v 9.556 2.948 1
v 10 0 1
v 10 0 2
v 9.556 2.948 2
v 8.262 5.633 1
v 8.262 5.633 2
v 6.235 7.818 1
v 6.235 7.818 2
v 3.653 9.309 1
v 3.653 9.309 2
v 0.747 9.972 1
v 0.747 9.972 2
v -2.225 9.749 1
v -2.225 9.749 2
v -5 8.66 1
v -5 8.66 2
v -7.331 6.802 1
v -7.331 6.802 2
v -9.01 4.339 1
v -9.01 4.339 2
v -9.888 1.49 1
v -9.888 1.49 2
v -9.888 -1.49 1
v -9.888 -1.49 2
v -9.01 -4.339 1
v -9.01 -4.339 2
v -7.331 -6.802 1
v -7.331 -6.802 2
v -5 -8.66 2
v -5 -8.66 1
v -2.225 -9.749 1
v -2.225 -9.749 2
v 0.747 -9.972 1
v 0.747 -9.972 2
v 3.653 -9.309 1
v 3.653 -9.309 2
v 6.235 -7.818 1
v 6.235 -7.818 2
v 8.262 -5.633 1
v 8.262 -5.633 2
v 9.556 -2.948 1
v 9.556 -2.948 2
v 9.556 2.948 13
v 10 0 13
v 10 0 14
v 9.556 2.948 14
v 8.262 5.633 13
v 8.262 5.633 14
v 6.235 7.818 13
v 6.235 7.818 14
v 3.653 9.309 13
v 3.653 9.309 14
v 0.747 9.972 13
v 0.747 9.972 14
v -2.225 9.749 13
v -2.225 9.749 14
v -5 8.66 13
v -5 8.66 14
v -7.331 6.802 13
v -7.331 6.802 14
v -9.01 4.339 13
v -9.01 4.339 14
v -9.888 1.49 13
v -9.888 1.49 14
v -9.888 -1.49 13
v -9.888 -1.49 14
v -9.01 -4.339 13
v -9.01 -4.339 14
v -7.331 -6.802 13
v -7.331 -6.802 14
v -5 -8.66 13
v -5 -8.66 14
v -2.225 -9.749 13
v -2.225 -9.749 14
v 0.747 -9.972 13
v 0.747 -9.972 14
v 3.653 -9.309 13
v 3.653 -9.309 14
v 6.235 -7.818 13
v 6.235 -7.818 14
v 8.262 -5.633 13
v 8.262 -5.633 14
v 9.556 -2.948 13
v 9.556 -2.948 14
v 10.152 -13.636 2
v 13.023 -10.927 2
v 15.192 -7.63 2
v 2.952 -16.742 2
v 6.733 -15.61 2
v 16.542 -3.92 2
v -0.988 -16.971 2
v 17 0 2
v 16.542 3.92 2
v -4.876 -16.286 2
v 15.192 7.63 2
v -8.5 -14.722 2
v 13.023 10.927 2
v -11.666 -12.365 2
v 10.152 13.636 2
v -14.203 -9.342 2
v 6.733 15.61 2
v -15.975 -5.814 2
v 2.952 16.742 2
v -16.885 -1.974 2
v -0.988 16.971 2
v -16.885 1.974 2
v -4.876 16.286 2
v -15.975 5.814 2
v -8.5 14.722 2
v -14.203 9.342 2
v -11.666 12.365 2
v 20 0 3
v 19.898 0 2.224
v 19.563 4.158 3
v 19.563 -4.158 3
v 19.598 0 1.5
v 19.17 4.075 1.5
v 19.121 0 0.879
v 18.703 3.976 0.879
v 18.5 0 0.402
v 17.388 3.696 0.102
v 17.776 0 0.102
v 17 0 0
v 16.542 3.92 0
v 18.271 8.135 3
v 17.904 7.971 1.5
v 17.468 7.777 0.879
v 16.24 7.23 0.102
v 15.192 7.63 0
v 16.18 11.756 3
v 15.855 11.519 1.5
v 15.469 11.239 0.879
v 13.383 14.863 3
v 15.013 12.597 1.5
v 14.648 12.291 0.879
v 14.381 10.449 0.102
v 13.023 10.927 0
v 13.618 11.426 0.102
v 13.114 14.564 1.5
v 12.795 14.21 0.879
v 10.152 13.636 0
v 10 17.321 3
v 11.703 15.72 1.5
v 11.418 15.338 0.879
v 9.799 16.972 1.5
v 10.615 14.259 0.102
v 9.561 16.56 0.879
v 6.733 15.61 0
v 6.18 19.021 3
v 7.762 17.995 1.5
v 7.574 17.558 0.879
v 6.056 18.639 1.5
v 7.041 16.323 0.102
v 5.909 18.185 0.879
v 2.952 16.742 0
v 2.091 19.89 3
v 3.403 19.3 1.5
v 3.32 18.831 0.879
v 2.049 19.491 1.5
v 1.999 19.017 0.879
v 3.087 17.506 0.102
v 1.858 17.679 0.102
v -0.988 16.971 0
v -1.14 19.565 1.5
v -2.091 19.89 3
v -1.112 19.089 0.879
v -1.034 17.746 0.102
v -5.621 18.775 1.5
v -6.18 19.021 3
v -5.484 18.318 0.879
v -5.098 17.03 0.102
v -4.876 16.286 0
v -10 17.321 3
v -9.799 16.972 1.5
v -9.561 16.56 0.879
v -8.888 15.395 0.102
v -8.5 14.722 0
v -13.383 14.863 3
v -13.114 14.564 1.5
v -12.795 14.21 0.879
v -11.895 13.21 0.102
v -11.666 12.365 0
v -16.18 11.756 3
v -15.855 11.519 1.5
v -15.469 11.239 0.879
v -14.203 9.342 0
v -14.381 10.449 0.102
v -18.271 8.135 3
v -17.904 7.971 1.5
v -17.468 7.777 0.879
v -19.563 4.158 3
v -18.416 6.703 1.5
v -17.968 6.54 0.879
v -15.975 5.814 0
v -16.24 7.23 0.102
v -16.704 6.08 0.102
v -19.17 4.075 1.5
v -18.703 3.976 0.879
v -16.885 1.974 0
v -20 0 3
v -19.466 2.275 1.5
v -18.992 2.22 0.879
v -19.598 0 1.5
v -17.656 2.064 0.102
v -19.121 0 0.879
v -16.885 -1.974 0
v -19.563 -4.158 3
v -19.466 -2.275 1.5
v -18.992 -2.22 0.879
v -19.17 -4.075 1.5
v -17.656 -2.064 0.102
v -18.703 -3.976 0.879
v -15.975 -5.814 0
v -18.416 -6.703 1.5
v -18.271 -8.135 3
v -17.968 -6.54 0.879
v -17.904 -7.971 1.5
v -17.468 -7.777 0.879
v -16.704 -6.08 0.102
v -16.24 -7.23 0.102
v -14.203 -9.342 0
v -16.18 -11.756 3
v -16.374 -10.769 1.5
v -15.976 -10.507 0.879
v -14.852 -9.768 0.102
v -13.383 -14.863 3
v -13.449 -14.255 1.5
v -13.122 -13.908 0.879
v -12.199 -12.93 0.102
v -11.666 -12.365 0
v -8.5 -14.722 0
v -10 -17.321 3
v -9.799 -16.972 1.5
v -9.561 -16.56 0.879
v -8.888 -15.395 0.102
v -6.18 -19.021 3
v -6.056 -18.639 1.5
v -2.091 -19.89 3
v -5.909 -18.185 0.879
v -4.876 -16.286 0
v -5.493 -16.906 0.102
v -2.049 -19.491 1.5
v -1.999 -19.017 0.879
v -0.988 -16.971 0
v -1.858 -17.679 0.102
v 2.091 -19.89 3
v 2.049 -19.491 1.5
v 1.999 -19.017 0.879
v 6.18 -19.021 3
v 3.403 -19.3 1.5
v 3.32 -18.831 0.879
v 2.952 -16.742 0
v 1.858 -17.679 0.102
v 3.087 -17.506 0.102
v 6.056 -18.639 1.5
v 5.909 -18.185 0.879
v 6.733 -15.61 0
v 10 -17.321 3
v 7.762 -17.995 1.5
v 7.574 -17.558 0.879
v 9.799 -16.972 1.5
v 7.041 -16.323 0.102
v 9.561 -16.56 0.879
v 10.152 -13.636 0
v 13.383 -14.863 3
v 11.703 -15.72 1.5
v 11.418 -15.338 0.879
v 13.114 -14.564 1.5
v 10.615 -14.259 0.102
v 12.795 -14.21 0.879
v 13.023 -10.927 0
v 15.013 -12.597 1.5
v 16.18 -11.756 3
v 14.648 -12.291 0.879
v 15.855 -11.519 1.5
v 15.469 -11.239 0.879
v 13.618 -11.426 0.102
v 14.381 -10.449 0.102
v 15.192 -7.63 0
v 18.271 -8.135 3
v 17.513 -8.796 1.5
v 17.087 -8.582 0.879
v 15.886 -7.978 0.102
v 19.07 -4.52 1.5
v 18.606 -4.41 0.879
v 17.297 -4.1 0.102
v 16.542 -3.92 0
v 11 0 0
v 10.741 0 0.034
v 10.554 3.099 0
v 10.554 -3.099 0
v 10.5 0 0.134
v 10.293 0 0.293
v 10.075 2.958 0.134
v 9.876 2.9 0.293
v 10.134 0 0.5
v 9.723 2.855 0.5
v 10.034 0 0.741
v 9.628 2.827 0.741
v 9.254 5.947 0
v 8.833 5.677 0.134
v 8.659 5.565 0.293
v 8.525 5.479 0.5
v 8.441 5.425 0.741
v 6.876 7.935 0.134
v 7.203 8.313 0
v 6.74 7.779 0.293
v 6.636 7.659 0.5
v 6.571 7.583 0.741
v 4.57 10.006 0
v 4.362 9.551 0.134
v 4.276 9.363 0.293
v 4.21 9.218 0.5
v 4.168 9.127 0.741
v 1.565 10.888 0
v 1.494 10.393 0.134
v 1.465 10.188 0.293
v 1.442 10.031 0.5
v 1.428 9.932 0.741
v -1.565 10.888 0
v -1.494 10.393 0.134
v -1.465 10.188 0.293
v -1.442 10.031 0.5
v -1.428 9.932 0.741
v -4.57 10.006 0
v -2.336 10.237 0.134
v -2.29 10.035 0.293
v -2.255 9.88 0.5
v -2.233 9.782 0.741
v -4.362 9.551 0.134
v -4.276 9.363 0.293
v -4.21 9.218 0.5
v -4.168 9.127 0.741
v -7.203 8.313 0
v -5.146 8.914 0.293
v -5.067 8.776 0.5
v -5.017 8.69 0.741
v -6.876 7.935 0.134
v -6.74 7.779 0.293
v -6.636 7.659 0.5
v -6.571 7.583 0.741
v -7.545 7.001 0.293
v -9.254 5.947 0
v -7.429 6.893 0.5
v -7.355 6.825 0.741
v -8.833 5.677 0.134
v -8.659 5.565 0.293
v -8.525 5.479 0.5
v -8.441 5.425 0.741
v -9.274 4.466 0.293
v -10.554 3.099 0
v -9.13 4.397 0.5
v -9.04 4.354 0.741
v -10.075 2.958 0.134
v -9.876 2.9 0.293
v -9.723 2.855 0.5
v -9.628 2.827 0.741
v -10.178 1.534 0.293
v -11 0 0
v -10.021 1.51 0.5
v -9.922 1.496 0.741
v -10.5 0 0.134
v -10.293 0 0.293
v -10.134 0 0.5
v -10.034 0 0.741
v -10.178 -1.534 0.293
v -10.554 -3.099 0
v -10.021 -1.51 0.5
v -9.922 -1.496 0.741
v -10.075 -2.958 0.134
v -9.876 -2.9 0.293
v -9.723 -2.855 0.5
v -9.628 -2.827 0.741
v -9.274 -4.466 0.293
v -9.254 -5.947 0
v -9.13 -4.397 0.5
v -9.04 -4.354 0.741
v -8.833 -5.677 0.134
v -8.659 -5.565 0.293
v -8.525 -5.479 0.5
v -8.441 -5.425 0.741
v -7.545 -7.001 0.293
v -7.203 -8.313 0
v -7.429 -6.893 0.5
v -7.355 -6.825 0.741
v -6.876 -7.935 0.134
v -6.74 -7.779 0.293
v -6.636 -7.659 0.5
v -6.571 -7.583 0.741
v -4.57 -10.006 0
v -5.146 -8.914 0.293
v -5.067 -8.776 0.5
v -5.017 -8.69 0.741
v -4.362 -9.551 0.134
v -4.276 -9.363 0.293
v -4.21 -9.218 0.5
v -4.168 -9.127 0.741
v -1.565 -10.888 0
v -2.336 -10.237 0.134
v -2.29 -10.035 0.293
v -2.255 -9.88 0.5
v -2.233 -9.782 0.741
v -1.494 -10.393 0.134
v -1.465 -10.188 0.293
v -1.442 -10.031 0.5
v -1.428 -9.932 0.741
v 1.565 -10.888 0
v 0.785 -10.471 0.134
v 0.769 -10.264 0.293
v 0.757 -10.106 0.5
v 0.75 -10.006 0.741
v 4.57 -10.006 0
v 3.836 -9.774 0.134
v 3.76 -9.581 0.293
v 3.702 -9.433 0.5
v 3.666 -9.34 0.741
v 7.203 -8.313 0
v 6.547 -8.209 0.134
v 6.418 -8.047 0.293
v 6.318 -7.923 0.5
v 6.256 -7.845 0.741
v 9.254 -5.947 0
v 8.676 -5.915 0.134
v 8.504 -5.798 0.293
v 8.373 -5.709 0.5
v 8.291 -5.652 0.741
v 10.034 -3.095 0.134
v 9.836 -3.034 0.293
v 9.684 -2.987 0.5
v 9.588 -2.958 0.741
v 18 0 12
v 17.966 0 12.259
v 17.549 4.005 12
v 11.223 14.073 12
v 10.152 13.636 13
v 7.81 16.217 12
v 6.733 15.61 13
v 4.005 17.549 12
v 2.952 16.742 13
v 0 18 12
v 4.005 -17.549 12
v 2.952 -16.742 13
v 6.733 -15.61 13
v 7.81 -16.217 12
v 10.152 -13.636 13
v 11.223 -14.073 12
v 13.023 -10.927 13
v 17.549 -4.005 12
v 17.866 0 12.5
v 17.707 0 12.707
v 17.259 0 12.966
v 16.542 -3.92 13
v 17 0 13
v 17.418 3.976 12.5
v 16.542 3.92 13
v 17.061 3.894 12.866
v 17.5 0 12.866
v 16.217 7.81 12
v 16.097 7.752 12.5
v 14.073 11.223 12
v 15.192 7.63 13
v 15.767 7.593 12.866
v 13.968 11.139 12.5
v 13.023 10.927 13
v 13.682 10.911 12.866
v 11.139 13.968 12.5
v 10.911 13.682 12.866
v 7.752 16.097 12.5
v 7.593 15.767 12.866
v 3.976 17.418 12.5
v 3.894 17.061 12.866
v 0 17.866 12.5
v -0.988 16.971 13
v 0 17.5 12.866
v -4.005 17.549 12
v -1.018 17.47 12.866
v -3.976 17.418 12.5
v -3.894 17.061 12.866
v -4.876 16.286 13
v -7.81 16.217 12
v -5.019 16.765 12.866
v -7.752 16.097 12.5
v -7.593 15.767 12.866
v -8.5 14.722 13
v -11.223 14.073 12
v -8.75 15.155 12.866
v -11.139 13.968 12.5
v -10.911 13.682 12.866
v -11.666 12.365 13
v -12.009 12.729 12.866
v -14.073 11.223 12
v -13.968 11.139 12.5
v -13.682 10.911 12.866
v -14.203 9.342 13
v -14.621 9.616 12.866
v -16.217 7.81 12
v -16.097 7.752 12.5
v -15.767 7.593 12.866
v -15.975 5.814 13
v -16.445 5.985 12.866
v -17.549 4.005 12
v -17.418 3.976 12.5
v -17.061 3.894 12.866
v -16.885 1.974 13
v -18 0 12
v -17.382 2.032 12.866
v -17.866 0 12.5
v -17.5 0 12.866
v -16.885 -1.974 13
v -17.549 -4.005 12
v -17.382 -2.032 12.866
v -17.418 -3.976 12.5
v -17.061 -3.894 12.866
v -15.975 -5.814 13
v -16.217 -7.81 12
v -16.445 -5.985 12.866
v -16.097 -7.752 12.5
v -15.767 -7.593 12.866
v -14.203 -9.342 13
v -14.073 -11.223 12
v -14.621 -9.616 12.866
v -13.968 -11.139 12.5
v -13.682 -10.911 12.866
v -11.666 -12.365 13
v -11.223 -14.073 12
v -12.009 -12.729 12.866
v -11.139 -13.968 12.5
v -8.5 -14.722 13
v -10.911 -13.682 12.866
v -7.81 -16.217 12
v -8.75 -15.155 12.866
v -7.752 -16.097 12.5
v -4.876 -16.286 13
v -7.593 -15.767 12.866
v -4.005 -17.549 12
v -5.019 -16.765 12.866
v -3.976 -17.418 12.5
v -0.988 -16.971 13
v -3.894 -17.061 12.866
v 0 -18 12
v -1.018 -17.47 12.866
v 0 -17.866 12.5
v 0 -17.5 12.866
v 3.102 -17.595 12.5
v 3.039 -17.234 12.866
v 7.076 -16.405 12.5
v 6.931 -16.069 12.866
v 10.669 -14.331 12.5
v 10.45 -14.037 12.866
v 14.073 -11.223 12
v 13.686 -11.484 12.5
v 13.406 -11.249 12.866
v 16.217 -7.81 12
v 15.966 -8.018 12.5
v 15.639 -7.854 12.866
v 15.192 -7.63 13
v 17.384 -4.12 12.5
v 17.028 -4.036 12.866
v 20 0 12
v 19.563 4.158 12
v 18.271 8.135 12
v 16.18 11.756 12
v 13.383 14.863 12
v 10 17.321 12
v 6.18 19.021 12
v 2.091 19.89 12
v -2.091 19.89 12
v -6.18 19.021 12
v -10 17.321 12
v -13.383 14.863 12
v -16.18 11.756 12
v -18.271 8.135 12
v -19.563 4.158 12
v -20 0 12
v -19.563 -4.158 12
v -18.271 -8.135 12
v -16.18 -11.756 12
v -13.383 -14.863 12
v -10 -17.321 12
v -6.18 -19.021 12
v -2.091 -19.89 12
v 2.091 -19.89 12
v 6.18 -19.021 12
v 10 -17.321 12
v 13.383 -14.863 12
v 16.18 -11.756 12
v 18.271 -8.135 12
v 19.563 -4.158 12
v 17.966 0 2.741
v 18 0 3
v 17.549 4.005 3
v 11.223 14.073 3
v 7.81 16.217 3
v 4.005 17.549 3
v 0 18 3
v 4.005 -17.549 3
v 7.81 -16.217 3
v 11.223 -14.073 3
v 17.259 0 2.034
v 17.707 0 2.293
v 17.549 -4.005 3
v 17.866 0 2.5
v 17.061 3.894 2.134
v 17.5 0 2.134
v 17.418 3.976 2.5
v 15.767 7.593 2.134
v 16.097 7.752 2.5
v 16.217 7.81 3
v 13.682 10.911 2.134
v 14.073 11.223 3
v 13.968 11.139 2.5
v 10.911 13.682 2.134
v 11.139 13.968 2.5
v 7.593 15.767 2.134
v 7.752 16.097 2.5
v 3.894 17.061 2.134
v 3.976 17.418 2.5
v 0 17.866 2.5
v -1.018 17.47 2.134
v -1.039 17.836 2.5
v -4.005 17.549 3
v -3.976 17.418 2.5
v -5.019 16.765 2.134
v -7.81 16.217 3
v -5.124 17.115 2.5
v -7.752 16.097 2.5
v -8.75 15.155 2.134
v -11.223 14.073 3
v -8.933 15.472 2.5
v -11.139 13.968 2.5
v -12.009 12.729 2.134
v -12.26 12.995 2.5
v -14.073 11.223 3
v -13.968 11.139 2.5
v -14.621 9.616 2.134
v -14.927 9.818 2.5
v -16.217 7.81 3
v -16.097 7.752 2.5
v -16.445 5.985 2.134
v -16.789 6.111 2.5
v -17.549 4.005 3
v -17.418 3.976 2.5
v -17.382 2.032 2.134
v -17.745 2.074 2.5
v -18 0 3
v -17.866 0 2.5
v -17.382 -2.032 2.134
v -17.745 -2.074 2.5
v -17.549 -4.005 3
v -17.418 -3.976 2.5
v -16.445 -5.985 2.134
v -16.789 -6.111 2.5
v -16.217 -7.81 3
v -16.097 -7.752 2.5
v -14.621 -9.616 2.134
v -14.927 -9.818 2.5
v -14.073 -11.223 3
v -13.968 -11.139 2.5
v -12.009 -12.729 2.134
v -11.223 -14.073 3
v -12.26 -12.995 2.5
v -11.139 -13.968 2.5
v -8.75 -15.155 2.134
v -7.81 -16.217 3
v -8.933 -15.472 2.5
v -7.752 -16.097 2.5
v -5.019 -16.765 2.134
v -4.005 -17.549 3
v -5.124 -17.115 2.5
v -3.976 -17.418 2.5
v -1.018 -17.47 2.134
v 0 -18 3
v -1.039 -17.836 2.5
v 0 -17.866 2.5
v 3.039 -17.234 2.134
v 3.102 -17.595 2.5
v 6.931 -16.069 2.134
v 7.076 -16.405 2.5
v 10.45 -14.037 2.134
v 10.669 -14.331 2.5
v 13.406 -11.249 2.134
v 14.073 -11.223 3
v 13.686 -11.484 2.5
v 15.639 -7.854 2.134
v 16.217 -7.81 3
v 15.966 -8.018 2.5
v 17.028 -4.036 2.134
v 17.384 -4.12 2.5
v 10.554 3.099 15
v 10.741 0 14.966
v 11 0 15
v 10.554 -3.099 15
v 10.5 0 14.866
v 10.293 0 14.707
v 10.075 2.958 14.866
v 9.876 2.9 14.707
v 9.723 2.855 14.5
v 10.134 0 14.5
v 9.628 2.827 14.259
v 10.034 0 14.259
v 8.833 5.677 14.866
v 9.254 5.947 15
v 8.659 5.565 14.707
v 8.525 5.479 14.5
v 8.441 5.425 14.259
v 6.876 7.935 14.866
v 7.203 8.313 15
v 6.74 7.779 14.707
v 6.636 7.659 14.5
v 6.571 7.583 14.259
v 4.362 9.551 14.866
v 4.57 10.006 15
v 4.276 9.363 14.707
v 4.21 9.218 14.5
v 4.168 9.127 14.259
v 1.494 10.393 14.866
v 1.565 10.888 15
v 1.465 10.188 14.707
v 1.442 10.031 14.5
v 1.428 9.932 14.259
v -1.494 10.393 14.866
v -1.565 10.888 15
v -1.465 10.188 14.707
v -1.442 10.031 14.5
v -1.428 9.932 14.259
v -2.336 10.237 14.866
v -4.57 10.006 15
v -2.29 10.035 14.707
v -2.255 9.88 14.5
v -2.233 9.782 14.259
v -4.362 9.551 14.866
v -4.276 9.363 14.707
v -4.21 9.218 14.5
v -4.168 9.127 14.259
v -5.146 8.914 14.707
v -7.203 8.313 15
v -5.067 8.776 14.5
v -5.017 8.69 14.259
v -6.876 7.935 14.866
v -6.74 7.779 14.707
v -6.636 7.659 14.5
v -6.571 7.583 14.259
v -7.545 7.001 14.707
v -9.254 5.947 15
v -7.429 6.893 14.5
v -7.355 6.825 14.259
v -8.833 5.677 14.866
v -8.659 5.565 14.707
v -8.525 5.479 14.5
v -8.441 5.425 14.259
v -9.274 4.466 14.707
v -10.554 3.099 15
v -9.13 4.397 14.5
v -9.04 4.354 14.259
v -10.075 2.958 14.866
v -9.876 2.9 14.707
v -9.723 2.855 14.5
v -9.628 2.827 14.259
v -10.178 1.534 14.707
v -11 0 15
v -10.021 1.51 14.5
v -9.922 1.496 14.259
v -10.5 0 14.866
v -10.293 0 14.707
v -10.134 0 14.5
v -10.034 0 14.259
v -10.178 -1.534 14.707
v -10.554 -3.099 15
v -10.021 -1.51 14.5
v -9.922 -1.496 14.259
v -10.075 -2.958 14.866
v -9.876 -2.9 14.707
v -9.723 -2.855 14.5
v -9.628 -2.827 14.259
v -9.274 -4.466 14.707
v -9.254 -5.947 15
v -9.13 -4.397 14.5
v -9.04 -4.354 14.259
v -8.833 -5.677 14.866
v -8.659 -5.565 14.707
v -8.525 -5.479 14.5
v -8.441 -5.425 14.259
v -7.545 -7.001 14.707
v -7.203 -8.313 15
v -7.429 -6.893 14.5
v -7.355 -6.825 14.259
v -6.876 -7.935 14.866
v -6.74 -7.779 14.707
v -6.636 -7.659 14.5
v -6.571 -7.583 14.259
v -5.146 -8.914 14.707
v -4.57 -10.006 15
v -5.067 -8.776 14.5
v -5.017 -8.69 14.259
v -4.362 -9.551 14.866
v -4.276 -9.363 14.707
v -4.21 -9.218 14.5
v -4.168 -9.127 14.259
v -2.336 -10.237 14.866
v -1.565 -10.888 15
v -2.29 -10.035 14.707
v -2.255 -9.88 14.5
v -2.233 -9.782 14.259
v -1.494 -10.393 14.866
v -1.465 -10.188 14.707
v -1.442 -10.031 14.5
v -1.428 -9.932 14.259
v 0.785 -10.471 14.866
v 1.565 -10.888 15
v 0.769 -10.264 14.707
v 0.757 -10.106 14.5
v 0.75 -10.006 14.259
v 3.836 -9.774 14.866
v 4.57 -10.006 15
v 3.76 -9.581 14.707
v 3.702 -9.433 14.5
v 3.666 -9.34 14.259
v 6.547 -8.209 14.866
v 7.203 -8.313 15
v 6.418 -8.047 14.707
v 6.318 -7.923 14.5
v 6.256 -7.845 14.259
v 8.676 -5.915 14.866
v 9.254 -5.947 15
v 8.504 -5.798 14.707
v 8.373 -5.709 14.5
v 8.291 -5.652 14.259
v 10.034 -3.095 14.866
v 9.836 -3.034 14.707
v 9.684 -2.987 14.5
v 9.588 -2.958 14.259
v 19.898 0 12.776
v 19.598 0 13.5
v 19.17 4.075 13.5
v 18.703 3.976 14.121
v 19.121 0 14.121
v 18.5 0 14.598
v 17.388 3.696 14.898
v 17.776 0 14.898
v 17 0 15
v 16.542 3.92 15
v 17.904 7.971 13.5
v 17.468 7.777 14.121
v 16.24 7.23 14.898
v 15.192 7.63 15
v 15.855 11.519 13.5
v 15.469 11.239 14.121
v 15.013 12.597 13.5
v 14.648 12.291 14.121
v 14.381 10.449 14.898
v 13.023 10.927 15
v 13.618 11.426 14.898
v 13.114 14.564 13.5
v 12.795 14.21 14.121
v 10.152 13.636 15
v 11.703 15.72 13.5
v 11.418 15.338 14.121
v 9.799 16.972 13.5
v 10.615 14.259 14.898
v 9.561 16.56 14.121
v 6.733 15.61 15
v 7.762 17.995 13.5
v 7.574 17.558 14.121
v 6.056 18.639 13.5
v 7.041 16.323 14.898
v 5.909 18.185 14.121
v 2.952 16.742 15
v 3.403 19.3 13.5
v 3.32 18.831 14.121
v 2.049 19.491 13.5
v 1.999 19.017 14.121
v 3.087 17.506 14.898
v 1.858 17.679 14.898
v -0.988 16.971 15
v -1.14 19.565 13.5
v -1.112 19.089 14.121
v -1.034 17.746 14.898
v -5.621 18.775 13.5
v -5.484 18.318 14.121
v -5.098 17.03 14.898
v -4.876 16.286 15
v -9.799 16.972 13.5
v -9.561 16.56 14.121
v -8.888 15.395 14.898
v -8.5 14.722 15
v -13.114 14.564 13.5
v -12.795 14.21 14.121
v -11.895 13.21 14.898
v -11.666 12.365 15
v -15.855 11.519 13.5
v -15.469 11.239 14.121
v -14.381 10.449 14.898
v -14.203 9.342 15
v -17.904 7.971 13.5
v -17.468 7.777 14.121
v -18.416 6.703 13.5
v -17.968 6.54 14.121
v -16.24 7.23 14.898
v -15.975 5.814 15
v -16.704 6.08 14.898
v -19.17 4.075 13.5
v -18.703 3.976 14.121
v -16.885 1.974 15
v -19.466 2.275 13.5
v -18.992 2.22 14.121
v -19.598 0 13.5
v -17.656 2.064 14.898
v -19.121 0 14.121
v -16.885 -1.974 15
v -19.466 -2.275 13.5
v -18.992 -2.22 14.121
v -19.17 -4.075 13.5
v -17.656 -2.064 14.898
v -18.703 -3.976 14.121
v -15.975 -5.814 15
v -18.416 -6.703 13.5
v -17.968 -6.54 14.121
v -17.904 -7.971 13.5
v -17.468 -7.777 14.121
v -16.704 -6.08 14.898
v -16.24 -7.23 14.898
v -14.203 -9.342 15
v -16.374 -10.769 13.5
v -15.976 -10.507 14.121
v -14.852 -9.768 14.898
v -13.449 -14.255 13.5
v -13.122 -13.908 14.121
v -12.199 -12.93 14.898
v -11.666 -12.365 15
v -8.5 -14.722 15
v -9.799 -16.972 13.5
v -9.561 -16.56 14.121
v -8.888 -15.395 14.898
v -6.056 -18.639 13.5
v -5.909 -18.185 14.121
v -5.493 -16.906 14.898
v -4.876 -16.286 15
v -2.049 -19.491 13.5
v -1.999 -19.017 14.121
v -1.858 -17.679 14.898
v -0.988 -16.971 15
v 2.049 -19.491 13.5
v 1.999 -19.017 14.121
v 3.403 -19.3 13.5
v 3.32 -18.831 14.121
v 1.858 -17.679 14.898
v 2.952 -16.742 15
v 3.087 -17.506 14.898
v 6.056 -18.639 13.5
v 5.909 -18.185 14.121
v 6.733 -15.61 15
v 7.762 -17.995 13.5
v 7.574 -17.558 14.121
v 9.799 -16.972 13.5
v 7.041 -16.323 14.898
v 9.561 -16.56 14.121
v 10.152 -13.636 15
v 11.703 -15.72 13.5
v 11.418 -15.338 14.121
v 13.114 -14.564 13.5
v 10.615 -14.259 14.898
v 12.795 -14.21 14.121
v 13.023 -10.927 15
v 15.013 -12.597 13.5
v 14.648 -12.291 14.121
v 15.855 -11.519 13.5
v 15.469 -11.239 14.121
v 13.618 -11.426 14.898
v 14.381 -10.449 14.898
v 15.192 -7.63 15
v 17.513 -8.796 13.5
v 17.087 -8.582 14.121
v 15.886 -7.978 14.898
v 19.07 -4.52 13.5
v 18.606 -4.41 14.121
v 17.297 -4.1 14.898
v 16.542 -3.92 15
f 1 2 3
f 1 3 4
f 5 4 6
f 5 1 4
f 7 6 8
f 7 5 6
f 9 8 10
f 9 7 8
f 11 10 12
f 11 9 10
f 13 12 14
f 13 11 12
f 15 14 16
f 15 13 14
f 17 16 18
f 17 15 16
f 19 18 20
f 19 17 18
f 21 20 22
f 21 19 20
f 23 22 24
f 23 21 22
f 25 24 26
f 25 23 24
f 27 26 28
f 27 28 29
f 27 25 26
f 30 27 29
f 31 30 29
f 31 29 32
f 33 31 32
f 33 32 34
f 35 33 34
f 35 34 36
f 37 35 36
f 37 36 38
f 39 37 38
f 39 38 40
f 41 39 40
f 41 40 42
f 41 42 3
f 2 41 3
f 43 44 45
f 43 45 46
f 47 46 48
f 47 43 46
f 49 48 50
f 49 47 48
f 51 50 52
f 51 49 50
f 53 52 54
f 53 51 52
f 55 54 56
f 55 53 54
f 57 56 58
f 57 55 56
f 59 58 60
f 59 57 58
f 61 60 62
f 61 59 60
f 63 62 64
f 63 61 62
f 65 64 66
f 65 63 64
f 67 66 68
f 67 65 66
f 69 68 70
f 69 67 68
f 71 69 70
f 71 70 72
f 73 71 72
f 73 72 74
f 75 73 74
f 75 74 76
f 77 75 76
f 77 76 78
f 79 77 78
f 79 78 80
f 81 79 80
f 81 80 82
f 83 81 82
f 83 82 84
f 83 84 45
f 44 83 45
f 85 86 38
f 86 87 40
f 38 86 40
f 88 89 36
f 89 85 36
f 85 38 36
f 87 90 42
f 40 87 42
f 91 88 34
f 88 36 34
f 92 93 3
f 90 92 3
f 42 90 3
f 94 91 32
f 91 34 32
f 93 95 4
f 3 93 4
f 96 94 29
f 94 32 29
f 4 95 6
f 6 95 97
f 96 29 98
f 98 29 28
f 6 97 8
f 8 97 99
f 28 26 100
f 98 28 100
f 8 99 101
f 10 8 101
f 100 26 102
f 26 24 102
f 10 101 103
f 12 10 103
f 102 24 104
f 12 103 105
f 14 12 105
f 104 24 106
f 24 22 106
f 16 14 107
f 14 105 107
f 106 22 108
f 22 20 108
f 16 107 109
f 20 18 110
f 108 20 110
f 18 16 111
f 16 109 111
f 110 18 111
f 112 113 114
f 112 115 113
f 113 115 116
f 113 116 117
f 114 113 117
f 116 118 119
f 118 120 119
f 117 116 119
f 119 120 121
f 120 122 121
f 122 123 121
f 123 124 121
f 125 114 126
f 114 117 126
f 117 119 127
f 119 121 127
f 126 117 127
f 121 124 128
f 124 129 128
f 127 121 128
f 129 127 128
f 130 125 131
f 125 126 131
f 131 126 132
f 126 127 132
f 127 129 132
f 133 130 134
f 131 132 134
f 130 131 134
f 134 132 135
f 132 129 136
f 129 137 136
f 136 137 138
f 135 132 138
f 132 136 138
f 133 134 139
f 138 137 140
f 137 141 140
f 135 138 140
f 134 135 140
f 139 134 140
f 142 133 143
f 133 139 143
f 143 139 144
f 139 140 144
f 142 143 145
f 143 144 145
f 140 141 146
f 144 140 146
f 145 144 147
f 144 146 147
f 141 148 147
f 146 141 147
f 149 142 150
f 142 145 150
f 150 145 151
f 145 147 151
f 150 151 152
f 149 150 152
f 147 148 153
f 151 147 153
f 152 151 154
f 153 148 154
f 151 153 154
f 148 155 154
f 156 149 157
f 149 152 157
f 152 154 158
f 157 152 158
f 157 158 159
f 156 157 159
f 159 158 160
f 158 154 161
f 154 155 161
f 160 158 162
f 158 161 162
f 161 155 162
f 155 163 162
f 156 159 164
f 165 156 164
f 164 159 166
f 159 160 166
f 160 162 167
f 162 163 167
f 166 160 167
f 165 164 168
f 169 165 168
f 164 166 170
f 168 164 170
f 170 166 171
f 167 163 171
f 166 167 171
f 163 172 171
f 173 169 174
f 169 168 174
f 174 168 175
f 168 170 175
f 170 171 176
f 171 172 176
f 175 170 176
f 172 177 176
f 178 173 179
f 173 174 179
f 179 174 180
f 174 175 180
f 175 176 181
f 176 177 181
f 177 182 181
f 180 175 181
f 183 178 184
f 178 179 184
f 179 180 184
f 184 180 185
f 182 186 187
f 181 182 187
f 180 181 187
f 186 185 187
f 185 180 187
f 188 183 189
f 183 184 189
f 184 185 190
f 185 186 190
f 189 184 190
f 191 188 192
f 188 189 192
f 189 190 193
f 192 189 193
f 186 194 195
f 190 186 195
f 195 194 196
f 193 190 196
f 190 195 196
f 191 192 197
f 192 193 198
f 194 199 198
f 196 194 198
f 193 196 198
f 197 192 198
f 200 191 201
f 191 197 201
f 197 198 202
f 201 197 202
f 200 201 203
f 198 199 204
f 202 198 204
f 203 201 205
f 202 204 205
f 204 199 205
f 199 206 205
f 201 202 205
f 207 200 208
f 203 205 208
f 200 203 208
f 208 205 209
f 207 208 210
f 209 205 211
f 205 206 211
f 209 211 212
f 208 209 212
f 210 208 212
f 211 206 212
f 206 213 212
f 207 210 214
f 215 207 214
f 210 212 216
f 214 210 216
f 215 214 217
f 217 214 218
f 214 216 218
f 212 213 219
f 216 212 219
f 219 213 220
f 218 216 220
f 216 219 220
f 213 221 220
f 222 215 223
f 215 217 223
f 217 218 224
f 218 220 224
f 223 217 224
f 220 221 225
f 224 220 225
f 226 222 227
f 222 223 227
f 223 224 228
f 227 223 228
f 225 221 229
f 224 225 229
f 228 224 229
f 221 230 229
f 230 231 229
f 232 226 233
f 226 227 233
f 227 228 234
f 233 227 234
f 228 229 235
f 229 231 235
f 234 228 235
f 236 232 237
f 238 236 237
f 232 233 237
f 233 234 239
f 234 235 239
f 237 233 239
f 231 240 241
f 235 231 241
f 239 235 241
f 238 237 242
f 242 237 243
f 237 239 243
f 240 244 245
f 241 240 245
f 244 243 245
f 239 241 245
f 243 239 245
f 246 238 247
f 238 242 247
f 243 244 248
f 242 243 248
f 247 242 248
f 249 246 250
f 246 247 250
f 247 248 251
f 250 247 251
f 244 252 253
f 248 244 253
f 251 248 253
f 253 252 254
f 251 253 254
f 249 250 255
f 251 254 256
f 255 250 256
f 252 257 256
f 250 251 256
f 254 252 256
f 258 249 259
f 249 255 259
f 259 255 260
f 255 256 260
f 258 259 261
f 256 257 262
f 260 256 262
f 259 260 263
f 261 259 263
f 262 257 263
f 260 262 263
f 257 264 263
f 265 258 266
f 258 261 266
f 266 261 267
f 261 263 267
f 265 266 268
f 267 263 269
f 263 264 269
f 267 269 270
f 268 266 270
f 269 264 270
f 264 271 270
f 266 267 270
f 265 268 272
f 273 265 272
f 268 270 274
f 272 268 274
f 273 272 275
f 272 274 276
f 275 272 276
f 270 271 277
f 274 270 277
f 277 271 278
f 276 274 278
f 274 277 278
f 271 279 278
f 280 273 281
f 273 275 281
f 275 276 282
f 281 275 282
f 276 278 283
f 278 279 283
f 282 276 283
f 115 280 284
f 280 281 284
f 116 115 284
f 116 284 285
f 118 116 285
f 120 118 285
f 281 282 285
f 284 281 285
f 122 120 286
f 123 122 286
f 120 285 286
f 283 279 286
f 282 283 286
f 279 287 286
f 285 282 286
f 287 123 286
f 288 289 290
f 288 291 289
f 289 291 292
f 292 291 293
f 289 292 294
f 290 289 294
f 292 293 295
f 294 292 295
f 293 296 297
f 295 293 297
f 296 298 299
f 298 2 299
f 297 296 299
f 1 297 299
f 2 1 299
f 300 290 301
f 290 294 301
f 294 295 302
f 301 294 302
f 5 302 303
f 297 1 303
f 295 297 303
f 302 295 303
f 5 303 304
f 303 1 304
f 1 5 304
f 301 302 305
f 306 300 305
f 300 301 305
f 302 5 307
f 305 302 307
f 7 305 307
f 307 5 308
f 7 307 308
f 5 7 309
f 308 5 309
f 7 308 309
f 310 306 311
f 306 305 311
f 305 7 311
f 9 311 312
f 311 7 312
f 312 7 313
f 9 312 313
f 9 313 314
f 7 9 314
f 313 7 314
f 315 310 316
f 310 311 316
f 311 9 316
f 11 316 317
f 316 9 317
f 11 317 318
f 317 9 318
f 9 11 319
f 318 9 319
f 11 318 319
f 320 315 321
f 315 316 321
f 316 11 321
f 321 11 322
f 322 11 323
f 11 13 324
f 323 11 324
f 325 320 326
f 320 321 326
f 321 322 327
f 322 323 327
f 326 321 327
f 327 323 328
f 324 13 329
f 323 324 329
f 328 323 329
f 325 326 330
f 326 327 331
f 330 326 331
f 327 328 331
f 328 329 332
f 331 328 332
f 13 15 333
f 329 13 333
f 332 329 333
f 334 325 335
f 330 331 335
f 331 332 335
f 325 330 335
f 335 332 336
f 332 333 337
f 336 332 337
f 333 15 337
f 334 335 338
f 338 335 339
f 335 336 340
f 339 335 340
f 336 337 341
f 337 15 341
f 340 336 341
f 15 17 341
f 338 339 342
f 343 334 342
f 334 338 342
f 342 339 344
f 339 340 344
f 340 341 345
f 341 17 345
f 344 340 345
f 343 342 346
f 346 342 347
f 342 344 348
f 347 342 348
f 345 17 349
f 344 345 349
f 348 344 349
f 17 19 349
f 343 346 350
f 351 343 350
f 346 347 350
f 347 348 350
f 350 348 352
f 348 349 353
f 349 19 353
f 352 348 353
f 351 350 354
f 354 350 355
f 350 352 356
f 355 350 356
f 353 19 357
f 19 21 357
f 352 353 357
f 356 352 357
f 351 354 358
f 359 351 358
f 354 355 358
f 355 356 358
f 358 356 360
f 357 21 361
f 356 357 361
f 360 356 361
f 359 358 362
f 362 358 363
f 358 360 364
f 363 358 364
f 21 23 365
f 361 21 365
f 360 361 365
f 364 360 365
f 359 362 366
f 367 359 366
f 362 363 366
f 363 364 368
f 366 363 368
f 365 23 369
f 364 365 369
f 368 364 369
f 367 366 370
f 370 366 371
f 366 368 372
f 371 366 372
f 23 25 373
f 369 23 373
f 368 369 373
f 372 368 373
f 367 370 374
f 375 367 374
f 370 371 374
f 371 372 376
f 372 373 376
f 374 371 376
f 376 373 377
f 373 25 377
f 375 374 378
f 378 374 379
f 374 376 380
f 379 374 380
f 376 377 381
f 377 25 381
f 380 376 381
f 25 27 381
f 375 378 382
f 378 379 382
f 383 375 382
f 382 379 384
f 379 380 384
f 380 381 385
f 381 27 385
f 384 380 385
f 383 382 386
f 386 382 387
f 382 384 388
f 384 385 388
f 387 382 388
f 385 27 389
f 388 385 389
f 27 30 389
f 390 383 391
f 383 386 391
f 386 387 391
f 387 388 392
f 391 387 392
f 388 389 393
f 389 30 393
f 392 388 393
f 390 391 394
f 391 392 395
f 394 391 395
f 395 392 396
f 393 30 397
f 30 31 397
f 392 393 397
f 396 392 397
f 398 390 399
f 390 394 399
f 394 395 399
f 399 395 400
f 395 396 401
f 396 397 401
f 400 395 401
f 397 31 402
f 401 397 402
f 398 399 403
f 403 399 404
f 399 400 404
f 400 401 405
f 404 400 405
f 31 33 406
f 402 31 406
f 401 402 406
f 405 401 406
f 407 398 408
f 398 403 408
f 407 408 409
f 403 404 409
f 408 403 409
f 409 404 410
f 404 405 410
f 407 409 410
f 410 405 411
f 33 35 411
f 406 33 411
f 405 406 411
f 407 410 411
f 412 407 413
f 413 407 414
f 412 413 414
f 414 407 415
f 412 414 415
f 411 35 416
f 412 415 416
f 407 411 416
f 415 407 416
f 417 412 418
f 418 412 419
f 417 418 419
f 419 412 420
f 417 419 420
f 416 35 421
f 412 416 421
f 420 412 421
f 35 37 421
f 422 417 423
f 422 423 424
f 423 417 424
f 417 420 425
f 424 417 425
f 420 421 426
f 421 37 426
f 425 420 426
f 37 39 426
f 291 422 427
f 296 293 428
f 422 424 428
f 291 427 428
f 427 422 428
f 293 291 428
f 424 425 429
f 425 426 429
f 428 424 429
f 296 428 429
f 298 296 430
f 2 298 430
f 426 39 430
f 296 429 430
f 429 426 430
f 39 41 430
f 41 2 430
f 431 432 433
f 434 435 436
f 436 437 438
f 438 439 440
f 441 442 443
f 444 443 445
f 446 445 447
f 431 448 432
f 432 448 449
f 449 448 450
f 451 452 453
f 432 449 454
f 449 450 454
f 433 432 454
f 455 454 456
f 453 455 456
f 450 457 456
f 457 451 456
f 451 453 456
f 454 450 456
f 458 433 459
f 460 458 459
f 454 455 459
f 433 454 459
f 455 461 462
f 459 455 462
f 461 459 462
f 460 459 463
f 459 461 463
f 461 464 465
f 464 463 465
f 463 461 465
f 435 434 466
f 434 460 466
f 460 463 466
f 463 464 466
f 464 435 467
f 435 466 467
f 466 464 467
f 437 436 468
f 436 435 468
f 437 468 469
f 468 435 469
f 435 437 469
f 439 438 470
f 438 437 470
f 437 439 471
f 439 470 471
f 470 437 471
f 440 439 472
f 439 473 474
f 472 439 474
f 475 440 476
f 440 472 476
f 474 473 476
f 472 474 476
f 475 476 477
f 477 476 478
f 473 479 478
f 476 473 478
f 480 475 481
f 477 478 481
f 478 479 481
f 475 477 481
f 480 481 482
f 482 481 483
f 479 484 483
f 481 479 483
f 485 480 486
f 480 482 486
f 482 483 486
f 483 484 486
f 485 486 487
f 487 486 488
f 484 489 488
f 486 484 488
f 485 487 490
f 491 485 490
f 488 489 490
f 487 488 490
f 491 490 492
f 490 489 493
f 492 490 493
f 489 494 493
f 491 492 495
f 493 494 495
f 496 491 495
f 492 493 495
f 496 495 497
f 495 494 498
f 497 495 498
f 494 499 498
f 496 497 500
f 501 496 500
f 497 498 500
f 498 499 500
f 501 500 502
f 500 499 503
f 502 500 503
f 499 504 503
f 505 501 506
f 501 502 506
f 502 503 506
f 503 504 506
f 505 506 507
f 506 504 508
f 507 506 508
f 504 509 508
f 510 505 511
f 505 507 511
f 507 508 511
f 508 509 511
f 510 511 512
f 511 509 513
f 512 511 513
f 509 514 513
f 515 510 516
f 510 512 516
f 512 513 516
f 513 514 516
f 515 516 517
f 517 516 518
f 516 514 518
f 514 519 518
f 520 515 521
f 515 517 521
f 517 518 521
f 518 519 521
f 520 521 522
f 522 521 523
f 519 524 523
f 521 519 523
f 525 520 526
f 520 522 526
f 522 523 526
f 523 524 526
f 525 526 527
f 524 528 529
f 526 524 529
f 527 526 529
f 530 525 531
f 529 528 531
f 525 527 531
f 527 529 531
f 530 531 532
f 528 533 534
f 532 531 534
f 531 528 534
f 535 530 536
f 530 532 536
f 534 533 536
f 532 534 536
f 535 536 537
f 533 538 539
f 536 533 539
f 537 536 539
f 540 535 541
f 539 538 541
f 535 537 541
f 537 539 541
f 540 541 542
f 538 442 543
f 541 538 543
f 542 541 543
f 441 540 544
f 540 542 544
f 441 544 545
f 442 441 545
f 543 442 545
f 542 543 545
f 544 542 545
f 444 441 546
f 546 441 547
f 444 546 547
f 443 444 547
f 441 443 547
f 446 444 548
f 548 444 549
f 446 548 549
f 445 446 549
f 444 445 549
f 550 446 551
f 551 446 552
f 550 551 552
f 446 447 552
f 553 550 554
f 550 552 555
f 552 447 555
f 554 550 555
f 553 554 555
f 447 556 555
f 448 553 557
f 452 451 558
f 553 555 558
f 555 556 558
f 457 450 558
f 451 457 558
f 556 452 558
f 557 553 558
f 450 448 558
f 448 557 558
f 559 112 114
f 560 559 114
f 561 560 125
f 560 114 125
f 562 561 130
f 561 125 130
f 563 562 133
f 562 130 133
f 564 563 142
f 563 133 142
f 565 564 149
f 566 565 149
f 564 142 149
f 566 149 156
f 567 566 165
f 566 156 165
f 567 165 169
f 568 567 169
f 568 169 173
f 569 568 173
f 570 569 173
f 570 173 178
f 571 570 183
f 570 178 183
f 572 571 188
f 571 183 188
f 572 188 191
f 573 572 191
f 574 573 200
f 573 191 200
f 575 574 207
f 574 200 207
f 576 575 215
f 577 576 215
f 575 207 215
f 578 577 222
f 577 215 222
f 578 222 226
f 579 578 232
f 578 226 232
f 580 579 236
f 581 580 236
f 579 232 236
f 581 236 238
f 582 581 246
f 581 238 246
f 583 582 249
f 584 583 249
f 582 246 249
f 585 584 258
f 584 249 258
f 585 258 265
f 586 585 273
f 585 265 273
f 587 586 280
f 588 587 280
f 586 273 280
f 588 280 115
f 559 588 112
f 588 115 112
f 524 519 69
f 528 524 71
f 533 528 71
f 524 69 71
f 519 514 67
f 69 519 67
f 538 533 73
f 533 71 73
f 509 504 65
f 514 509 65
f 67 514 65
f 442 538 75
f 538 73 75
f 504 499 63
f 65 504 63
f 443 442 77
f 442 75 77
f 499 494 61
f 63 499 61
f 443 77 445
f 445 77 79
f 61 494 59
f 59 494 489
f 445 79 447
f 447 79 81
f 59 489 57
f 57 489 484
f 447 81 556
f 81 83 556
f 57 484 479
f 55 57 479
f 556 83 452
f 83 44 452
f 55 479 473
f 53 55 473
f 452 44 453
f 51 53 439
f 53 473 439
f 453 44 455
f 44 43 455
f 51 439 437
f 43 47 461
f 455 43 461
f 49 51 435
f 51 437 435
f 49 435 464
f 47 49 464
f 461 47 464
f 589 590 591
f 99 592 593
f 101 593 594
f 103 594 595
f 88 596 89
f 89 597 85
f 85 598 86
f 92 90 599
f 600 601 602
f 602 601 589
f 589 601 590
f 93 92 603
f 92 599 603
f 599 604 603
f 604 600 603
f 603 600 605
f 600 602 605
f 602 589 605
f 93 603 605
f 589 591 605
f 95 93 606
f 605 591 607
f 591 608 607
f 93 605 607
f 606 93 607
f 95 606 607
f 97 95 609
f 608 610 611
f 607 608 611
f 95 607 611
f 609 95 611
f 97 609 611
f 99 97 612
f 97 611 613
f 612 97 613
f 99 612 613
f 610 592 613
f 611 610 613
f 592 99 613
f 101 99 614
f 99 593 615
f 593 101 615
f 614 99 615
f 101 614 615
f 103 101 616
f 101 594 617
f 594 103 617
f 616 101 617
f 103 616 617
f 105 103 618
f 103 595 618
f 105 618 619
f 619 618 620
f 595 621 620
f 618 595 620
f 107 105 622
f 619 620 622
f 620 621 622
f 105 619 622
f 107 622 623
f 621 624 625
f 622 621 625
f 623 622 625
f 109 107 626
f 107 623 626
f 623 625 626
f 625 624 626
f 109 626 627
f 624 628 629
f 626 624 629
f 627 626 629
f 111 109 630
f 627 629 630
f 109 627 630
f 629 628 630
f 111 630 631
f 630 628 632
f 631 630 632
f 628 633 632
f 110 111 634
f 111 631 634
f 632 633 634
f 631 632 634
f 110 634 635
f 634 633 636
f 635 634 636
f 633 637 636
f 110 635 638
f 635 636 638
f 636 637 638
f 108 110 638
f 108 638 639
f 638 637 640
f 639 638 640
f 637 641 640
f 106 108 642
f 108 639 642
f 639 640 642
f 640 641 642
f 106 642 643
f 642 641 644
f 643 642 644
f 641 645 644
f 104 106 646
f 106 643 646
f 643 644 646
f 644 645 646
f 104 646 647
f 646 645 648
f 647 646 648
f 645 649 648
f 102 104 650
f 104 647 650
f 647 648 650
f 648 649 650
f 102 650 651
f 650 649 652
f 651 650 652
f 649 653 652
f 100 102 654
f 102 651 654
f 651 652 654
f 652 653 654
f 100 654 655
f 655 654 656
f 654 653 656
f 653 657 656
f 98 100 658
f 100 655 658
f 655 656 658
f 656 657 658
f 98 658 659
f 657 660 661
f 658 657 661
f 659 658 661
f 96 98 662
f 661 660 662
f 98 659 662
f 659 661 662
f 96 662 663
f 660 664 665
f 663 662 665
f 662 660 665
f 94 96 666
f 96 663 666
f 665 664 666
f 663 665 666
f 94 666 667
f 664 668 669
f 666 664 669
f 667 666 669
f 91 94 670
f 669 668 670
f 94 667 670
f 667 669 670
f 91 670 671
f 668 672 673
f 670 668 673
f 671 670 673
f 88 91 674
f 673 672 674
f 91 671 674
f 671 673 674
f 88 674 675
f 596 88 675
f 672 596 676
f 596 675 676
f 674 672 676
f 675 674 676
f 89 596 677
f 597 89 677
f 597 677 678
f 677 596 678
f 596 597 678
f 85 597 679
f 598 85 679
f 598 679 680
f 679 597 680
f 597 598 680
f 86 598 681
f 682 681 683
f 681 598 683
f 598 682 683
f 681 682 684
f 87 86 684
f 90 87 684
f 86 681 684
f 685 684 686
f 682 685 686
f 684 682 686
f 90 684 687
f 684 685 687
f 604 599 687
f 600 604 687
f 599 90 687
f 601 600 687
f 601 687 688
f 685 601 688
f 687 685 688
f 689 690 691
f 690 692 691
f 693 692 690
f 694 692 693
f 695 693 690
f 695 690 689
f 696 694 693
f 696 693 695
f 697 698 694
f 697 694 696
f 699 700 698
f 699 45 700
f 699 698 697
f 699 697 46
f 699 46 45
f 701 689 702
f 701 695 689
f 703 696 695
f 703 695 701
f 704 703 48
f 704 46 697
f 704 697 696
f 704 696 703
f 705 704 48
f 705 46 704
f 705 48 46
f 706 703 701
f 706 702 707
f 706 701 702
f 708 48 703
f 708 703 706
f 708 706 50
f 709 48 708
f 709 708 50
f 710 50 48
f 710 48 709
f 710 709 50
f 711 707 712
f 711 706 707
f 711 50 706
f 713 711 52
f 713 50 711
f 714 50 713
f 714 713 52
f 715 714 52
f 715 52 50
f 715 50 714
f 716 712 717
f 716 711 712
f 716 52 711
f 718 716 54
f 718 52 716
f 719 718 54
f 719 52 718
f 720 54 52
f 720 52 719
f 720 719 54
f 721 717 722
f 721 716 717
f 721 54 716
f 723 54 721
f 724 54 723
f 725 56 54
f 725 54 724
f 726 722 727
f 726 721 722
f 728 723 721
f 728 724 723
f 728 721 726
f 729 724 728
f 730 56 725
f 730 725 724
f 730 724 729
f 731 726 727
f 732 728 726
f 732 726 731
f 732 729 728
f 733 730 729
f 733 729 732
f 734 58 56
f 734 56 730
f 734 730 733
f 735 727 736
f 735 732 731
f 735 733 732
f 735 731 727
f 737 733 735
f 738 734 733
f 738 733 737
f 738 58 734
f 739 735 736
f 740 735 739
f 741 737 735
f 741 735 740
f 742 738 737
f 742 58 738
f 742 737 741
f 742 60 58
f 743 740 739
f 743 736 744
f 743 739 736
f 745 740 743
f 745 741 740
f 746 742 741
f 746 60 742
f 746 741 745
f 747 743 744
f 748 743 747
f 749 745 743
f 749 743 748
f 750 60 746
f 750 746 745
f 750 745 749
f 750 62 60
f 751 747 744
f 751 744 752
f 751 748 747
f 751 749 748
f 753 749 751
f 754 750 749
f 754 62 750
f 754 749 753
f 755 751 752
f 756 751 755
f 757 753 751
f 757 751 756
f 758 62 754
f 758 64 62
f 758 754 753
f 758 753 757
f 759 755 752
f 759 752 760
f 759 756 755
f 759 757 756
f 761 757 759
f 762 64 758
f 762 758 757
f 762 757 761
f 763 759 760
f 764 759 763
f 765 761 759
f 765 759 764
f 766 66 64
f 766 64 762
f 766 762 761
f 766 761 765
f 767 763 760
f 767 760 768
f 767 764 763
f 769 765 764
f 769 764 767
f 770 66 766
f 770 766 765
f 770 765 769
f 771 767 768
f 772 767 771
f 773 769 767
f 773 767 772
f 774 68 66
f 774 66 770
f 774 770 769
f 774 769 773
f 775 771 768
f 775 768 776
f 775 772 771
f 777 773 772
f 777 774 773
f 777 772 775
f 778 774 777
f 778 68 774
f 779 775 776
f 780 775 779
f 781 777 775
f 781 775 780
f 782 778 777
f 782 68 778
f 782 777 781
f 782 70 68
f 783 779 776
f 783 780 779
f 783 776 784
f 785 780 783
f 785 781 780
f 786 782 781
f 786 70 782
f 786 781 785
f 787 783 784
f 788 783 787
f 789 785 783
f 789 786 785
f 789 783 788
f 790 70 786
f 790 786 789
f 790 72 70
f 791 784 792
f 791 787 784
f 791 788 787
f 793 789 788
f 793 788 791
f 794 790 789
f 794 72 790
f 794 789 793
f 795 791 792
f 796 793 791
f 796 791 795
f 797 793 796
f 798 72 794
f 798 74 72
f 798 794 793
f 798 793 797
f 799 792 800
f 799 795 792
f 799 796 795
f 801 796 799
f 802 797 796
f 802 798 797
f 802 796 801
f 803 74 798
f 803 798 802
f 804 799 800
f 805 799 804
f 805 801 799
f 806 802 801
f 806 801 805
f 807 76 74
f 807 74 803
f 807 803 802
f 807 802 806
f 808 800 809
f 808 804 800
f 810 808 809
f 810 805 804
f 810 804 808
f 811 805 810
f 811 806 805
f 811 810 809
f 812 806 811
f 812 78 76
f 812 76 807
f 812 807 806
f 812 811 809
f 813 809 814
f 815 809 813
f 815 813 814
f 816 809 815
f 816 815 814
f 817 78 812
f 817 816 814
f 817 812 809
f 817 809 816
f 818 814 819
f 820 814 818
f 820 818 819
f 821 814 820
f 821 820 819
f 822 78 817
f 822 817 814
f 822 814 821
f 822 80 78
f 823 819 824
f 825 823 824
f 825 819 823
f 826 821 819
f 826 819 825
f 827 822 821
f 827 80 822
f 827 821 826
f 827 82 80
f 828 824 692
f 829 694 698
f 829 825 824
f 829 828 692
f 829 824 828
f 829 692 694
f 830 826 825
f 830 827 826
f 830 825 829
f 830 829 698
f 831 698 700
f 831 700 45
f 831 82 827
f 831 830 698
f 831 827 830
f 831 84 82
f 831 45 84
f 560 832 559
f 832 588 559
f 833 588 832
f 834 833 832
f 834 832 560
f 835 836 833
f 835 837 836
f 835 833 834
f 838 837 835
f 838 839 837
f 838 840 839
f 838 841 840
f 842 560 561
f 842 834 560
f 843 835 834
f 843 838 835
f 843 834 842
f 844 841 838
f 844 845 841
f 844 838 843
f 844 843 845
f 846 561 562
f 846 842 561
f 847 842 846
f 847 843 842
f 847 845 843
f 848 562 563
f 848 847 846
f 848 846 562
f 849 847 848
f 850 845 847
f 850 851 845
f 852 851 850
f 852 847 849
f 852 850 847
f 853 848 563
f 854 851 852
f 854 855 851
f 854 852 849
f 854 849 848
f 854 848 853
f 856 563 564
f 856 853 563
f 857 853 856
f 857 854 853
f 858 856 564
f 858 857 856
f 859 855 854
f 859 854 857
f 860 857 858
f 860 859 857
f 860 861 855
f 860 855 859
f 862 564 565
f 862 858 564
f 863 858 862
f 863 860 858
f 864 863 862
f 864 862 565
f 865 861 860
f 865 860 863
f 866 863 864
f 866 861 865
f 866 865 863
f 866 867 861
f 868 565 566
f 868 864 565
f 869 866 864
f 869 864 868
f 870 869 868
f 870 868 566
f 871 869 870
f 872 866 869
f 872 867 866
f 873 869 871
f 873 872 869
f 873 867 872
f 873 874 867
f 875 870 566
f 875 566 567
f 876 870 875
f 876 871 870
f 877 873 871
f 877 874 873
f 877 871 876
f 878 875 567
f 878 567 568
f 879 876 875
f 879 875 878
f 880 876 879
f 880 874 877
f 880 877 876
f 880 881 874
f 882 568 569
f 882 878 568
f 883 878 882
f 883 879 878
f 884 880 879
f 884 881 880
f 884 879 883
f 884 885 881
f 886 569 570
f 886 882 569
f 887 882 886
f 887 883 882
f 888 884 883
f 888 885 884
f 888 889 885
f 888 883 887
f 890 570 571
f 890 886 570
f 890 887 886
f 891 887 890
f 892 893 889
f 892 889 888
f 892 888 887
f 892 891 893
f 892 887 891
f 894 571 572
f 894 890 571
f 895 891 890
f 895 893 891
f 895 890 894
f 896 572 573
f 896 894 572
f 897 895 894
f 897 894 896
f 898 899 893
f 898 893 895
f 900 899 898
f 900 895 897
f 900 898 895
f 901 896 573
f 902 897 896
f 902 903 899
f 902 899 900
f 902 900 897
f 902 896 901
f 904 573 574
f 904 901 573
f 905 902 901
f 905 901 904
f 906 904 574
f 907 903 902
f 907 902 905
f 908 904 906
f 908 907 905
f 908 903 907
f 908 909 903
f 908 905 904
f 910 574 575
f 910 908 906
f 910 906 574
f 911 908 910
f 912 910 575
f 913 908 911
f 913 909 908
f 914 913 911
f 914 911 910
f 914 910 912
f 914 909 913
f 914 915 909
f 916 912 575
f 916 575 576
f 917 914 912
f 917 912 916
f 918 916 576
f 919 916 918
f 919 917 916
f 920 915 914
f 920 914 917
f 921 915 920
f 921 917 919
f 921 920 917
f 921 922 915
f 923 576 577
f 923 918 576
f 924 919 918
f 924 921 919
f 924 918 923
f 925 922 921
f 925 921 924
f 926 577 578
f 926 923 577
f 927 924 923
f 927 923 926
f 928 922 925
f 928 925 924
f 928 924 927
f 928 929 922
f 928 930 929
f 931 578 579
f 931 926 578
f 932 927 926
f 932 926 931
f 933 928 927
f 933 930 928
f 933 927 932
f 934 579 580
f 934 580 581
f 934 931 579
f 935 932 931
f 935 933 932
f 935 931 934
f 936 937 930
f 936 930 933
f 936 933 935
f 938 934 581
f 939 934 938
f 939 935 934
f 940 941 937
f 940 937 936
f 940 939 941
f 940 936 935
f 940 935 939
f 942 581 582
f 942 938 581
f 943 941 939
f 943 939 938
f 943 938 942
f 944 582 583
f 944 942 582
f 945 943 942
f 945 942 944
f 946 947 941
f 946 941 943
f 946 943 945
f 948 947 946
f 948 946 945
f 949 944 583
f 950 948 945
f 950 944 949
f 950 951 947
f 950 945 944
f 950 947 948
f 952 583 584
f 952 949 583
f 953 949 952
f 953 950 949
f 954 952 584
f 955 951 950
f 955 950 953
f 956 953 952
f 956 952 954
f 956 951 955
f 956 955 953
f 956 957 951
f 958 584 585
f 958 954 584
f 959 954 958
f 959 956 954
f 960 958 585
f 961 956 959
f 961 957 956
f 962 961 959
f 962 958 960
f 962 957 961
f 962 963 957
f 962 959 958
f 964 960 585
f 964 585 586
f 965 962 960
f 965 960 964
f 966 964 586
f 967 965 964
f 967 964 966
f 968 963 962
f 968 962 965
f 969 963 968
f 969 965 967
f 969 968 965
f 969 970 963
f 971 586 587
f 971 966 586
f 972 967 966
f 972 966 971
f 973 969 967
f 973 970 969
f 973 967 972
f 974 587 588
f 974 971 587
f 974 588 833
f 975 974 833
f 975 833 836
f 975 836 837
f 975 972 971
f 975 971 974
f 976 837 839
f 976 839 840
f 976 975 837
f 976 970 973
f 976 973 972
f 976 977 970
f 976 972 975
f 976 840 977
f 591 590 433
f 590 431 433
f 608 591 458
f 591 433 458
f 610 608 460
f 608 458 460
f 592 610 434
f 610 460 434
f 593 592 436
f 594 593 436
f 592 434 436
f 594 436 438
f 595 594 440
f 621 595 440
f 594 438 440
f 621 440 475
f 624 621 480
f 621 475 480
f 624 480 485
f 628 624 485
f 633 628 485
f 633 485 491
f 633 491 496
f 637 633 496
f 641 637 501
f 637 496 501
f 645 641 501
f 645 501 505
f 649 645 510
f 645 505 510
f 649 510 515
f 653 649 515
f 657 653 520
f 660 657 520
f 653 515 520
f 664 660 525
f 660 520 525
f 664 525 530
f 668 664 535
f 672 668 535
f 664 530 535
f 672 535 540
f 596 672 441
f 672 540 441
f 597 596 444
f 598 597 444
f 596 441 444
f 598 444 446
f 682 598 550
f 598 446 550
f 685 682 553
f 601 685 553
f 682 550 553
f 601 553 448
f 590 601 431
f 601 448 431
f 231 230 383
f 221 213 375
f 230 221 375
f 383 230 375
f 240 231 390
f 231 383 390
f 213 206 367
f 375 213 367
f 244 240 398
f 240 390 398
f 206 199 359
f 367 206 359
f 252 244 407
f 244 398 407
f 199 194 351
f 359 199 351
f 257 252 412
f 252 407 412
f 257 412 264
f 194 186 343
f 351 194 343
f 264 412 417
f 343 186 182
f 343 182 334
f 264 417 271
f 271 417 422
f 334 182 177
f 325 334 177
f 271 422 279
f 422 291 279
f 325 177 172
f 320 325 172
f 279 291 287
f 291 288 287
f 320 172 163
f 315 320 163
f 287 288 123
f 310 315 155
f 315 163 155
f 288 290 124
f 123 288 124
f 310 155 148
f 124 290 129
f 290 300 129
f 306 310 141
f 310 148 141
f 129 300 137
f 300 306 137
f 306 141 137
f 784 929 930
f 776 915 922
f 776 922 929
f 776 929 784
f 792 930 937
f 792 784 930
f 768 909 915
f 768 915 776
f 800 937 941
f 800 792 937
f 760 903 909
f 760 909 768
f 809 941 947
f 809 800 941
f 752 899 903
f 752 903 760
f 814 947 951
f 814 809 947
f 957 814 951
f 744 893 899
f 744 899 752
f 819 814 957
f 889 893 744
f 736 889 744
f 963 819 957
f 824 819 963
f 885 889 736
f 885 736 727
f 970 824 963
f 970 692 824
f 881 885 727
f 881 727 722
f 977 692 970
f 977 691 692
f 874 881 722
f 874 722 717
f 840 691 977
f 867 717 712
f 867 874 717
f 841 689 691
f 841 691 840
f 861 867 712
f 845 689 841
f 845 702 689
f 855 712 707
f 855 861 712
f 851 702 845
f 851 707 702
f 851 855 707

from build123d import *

# Parameters (mm, degrees)
SKETCH2_R           = 20
SKETCH2_R_2         = 10
EXTRUDE_THIN1_DEPTH = 15
FILLET1_R           = 3
FILLET2_R           = 1


# Read off the part's stored shape, not the designer's step: Shell1
with BuildPart() as part:
    # Sketch2 → Extrude-Thin1 (new body)
    with BuildSketch(Plane.XY):
        Circle(SKETCH2_R)
        Circle(SKETCH2_R_2, mode=Mode.SUBTRACT)
    extrude(amount=EXTRUDE_THIN1_DEPTH)

    # Fillet1
    fillet1_edges = [part.edges().sort_by_distance(p)[0] for p in [
        (-20, 0, 0),
        (-20, 0, 15),
    ]]
    fillet(fillet1_edges, radius=FILLET1_R)

    # Fillet2
    fillet2_edges = [part.edges().sort_by_distance(p)[0] for p in [
        (-10, 0, 0),
        (-10, 0, 15),
    ]]
    fillet(fillet2_edges, radius=FILLET2_R)

    # Shell1 outline → Shell1 (revolve, cut)
    with BuildSketch(Plane.XZ):
        with BuildLine():
            Line((17, 13), (10, 13))
            Line((10, 13), (10, 2))
            Line((10, 2), (17, 2))
            ThreePointArc((17, 2), (17.707106781, 2.292893219), (18, 3))
            Line((18, 3), (18, 12))
            ThreePointArc((18, 12), (17.707106781, 12.707106781), (17, 13))
        make_face()
    revolve(axis=Axis((0, 0, 0), (0, 0, 1)), mode=Mode.SUBTRACT)


solid = part.part
